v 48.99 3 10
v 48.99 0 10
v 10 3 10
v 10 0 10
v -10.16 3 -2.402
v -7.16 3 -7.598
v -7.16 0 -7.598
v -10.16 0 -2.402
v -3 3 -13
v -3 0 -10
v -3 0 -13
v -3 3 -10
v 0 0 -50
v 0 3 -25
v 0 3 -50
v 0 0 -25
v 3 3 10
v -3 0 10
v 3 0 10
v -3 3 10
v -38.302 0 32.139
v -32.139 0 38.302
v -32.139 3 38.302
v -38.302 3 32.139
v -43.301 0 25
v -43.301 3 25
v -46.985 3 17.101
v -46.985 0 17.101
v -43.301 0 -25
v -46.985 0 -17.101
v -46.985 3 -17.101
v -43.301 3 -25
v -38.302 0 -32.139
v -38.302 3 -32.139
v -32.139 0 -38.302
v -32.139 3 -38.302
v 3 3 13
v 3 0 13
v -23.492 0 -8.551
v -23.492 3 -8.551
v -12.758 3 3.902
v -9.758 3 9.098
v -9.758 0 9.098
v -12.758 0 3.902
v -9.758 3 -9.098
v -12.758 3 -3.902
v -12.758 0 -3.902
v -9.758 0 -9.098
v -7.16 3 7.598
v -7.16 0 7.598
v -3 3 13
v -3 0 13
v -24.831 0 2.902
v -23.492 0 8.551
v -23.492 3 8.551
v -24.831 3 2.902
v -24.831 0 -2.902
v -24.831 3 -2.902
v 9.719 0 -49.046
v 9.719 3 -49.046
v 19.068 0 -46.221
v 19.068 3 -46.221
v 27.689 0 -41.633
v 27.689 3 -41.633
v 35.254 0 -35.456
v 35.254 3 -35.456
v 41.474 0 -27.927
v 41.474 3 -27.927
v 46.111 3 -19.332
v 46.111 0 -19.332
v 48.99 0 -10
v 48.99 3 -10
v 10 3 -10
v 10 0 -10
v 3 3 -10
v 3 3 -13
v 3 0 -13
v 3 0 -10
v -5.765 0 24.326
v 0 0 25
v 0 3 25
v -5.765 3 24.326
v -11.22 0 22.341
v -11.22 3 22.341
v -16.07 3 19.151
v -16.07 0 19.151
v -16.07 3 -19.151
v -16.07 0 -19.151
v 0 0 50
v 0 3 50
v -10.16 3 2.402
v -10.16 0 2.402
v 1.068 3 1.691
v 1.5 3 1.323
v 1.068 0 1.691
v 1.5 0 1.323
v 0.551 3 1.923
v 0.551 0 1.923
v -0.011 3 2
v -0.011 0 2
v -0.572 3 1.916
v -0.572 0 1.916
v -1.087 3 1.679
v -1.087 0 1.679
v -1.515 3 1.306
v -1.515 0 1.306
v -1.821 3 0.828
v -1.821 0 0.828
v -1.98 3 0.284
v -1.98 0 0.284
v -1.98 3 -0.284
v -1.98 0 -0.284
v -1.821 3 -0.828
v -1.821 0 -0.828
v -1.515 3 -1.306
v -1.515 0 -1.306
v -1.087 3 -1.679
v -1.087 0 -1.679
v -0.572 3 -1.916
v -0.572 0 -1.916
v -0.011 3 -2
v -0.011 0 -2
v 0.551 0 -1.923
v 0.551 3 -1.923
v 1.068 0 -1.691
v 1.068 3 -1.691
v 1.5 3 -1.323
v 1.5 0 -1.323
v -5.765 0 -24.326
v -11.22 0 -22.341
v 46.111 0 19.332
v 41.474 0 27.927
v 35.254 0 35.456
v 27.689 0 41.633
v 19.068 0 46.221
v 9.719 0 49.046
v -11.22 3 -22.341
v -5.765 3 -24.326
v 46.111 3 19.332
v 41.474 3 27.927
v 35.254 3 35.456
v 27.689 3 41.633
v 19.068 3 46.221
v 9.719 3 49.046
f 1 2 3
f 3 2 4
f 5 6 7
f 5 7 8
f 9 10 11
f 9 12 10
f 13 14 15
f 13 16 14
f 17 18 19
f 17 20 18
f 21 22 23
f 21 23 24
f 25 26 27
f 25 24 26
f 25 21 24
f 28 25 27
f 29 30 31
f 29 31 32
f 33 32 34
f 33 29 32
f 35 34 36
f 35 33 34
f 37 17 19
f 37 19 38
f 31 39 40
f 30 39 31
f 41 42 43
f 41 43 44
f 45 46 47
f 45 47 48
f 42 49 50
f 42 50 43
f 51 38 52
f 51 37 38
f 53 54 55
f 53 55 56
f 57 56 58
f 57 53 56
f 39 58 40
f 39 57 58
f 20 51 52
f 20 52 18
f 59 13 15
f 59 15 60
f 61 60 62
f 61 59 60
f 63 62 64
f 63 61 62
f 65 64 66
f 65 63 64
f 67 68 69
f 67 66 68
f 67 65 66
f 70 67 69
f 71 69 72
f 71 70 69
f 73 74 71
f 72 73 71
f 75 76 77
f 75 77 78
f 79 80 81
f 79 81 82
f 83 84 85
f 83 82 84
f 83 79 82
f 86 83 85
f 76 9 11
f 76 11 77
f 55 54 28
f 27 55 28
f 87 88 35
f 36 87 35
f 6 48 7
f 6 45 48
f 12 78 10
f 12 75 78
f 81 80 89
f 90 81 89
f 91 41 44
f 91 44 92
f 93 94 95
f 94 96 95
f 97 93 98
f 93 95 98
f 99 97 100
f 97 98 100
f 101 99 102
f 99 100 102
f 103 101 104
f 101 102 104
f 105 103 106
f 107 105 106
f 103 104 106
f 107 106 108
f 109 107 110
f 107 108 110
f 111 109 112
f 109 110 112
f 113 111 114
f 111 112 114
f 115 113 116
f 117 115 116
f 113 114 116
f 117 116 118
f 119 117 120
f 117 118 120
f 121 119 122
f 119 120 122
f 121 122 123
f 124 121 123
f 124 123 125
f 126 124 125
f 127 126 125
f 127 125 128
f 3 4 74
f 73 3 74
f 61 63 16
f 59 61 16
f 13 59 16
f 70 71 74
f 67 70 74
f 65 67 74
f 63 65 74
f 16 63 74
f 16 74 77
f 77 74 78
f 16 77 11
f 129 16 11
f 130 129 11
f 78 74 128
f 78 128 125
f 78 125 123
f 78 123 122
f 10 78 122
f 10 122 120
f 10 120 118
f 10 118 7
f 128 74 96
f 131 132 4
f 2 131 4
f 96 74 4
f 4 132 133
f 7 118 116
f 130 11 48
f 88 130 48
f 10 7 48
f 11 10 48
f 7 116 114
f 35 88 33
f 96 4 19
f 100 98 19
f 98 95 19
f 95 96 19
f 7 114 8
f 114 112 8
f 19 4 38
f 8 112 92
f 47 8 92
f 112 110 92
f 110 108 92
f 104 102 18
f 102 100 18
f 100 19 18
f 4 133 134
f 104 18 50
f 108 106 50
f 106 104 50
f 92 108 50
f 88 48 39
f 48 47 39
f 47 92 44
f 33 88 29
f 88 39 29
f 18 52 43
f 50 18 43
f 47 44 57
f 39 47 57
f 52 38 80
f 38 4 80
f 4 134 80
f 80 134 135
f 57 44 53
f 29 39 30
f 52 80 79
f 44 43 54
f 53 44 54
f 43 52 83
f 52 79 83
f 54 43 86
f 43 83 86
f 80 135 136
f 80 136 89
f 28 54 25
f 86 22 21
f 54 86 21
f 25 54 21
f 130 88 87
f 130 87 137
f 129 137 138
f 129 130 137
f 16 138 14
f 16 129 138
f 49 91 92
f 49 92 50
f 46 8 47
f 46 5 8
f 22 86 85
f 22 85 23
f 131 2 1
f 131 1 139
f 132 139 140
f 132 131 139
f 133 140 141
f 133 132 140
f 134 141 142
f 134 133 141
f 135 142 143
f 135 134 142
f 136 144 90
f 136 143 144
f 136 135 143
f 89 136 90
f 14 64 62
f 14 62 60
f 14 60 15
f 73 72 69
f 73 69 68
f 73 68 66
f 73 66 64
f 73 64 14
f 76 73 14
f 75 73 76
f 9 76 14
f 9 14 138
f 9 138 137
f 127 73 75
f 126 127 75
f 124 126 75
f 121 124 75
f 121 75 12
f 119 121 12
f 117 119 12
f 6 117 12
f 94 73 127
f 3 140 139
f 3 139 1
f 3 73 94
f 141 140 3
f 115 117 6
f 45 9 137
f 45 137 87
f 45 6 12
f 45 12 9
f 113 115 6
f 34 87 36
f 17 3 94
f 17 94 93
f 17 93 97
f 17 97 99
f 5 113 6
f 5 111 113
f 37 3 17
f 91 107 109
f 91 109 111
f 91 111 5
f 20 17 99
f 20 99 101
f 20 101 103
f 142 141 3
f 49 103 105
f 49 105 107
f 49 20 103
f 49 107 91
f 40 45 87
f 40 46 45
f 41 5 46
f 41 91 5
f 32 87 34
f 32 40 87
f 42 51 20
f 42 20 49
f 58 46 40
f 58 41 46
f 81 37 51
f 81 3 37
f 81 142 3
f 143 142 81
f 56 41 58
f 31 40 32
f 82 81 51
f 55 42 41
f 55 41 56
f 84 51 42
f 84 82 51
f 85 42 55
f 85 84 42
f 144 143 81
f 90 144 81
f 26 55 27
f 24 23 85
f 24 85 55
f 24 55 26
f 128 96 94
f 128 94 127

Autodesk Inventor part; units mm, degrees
ref_plane "YZ Plane" through (0, 0, 0) normal (1, 0, 0) x (0, 1, 0)
ref_plane "XZ Plane" through (0, 0, 0) normal (0, 1, 0) x (-1, 0, 0)
ref_plane "XY Plane" through (0, 0, 0) normal (0, 0, 1) x (1, 0, 0)
sketch "草圖1" plane through (0, 0, 0) normal (0, 1, 0) x (-1, 0, 0)
  circle A0 centre (0, 0) radius 50
  circle A1 centre (0, 0) radius 25
  line L0 (-50, 10) -> (-10, 10)
  line L1 (-10, 10) -> (-10, -10)
  line L2 (-10, -10) -> (-50, -10)
  line L3 (-50, -10) -> (-50, 10)
  line L4 (0, 0) -> (0, -50)
  line L5 (0, 0) -> (32.1394, -38.3022)
  arc A2 (0, -50) -> (32.1394, -38.3022) centre (0, 0) ccw
  line L6 (0, 0) -> (46.9846, -17.101)
  line L7 (0, 0) -> (46.9846, 17.101)
  arc A3 (46.9846, -17.101) -> (46.9846, 17.101) centre (0, 0) ccw
  line L8 (0, 0) -> (32.1394, 38.3022)
  line L9 (0, 0) -> (0, 50)
  arc A4 (32.1394, 38.3022) -> (0, 50) centre (0, 0) ccw
  circle A5 centre (0, 0) radius 2
  line L10 (-1.5, 1.3229) -> (-1.5, -1.3229)
  point P0 (16.0697, -19.1511)
  point P1 (0, -25)
  point P2 (-48.9898, 10)
  point P3 (-48.9898, -10)
  point P4 (16.0697, 19.1511)
  point P5 (0, 25)
  point P6 (23.4923, -8.5505)
  point P7 (23.4923, 8.5505)
  point P8 (-50, 0)
  dimension "d0" = 100
  dimension "d1" = 50
  dimension "d2" = 20
  dimension "d3" = 40
  dimension "d5" = 40
  dimension "d6" = 50
  dimension "d9" = 140
  dimension "d28" = 4
  dimension "d29" = 1.5
  dimension "d30" = 50
extrude "擠出1" add sketch "草圖1" along normal blind 3 contours L7 A1 L8 A0 | A0 L5 A1 L6 | L7 A5 L8 A1 | A1 L6 A5 L7 | A1 L5 A5 L6 | L9 A1 L0 A0 | L8 A5 L9 A1 | A0 L2 A1 L4 | A1 L4 A5 L5 | L9 A5 L4 A1 L2 L1 L0 | L10 A5
sketch "草圖2" plane through (0, 3, 0) normal (0, 1, 0) x (1, 0, 0)
  line L0 (-3, 13) -> (3, 13)
  line L1 (3, 13) -> (3, 10)
  line L2 (3, 10) -> (-3, 10)
  line L3 (-3, 10) -> (-3, 13)
  line L4 (-12.7583, 3.9019) -> (-9.7583, 9.0981)
  line L5 (-9.7583, 9.0981) -> (-7.1603, 7.5981)
  line L6 (-7.1603, 7.5981) -> (-10.1603, 2.4019)
  line L7 (-10.1603, 2.4019) -> (-12.7583, 3.9019)
  line L8 (-9.7583, -9.0981) -> (-12.7583, -3.9019)
  line L9 (-12.7583, -3.9019) -> (-10.1603, -2.4019)
  line L10 (-10.1603, -2.4019) -> (-7.1603, -7.5981)
  line L11 (-7.1603, -7.5981) -> (-9.7583, -9.0981)
  line L12 (3, -13) -> (-3, -13)
  line L13 (-3, -13) -> (-3, -10)
  line L14 (-3, -10) -> (3, -10)
  line L15 (3, -10) -> (3, -13)
  point P0 (0, 0)
  point P1 (0, 10)
  point P2 (-8.6603, 5)
  point P3 (-8.6603, -5)
  point P4 (0, -10)
  dimension "d31" = 3
  dimension "d32" = 6
  dimension "d33" = 10
  dimension "d36" = 180
extrude "擠出2" cut sketch "草圖2" against normal through all
properties part number "rolling_plate_small"
